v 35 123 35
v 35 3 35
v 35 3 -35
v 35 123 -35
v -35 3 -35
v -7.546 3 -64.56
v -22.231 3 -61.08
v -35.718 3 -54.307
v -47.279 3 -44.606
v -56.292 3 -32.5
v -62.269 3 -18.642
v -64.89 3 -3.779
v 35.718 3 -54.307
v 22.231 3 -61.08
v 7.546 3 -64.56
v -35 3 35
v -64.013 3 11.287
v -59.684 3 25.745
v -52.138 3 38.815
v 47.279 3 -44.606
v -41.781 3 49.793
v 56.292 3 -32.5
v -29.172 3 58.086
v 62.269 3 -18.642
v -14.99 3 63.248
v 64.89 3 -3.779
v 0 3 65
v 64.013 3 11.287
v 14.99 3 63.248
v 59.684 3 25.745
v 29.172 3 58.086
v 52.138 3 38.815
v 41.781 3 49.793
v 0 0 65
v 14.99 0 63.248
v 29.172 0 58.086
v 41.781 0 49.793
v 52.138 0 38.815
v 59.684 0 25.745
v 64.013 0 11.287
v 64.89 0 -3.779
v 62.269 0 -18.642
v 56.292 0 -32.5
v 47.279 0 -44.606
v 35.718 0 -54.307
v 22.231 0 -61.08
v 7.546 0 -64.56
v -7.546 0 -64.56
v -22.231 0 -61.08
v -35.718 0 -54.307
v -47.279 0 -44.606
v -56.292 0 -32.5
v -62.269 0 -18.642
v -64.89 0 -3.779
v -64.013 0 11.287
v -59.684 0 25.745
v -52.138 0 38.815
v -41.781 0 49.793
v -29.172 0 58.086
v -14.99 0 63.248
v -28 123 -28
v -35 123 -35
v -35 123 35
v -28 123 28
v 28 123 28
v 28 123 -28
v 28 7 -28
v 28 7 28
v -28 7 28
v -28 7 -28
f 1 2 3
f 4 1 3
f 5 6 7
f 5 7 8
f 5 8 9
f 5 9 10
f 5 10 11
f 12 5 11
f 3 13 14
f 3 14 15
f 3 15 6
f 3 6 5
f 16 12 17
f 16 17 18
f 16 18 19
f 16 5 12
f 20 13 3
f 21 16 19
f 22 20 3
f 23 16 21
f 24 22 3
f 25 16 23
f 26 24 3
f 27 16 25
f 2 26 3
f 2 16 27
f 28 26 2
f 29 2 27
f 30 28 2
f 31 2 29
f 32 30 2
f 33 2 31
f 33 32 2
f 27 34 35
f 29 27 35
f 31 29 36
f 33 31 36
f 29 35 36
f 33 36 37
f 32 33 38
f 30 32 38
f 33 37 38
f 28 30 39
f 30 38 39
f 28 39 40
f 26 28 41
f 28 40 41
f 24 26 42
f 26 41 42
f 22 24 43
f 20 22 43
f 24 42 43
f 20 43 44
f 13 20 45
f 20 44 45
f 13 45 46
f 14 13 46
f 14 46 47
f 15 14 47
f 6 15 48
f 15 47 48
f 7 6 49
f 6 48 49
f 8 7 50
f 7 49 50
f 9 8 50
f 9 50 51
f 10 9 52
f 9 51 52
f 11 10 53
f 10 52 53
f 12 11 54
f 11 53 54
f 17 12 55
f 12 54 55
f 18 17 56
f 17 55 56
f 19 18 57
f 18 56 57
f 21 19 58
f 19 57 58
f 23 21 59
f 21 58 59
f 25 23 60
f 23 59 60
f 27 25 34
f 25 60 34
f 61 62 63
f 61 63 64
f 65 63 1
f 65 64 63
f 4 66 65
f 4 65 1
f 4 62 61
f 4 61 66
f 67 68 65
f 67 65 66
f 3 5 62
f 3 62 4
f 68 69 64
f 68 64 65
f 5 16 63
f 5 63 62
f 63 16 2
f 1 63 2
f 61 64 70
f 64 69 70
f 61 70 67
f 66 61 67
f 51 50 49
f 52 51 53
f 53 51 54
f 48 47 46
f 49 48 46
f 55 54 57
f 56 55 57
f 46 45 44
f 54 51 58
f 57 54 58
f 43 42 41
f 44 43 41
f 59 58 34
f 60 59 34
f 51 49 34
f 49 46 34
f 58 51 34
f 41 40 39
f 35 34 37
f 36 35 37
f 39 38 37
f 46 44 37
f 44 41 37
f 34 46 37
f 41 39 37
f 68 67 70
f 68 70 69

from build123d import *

# Parameters (mm, degrees)
SKETCH_1_R      = 65
EXTRUDE_1_DEPTH = 3
SKETCH_2_W      = 70
SKETCH_2_H      = 70
EXTRUDE_2_DEPTH = 120
SHELL_2_T       = -7


with BuildPart() as part:
    # 草图1 → 凸台-拉伸1 (new body)
    with BuildSketch(Plane(origin=(0, 0, 0), x_dir=(1, 0, 0), z_dir=(0, 1, 0))):
        with Locations(Location((0, 0, 0), (0, 0, 270))):
            Circle(SKETCH_1_R)
    extrude(amount=EXTRUDE_1_DEPTH)

    # 草图2 → 凸台-拉伸2 (add)
    with BuildSketch(Plane(origin=(0, 3, 0), x_dir=(1, 0, 0), z_dir=(0, 1, 0))):
        Rectangle(SKETCH_2_W, SKETCH_2_H)
    extrude(amount=EXTRUDE_2_DEPTH)

    # 抽壳2
    shell_2_openings = [part.faces().sort_by_distance(p)[0] for p in [
        (0, 123, 0),
    ]]
    offset(amount=SHELL_2_T, openings=shell_2_openings, kind=Kind.INTERSECTION)


solid = part.part
